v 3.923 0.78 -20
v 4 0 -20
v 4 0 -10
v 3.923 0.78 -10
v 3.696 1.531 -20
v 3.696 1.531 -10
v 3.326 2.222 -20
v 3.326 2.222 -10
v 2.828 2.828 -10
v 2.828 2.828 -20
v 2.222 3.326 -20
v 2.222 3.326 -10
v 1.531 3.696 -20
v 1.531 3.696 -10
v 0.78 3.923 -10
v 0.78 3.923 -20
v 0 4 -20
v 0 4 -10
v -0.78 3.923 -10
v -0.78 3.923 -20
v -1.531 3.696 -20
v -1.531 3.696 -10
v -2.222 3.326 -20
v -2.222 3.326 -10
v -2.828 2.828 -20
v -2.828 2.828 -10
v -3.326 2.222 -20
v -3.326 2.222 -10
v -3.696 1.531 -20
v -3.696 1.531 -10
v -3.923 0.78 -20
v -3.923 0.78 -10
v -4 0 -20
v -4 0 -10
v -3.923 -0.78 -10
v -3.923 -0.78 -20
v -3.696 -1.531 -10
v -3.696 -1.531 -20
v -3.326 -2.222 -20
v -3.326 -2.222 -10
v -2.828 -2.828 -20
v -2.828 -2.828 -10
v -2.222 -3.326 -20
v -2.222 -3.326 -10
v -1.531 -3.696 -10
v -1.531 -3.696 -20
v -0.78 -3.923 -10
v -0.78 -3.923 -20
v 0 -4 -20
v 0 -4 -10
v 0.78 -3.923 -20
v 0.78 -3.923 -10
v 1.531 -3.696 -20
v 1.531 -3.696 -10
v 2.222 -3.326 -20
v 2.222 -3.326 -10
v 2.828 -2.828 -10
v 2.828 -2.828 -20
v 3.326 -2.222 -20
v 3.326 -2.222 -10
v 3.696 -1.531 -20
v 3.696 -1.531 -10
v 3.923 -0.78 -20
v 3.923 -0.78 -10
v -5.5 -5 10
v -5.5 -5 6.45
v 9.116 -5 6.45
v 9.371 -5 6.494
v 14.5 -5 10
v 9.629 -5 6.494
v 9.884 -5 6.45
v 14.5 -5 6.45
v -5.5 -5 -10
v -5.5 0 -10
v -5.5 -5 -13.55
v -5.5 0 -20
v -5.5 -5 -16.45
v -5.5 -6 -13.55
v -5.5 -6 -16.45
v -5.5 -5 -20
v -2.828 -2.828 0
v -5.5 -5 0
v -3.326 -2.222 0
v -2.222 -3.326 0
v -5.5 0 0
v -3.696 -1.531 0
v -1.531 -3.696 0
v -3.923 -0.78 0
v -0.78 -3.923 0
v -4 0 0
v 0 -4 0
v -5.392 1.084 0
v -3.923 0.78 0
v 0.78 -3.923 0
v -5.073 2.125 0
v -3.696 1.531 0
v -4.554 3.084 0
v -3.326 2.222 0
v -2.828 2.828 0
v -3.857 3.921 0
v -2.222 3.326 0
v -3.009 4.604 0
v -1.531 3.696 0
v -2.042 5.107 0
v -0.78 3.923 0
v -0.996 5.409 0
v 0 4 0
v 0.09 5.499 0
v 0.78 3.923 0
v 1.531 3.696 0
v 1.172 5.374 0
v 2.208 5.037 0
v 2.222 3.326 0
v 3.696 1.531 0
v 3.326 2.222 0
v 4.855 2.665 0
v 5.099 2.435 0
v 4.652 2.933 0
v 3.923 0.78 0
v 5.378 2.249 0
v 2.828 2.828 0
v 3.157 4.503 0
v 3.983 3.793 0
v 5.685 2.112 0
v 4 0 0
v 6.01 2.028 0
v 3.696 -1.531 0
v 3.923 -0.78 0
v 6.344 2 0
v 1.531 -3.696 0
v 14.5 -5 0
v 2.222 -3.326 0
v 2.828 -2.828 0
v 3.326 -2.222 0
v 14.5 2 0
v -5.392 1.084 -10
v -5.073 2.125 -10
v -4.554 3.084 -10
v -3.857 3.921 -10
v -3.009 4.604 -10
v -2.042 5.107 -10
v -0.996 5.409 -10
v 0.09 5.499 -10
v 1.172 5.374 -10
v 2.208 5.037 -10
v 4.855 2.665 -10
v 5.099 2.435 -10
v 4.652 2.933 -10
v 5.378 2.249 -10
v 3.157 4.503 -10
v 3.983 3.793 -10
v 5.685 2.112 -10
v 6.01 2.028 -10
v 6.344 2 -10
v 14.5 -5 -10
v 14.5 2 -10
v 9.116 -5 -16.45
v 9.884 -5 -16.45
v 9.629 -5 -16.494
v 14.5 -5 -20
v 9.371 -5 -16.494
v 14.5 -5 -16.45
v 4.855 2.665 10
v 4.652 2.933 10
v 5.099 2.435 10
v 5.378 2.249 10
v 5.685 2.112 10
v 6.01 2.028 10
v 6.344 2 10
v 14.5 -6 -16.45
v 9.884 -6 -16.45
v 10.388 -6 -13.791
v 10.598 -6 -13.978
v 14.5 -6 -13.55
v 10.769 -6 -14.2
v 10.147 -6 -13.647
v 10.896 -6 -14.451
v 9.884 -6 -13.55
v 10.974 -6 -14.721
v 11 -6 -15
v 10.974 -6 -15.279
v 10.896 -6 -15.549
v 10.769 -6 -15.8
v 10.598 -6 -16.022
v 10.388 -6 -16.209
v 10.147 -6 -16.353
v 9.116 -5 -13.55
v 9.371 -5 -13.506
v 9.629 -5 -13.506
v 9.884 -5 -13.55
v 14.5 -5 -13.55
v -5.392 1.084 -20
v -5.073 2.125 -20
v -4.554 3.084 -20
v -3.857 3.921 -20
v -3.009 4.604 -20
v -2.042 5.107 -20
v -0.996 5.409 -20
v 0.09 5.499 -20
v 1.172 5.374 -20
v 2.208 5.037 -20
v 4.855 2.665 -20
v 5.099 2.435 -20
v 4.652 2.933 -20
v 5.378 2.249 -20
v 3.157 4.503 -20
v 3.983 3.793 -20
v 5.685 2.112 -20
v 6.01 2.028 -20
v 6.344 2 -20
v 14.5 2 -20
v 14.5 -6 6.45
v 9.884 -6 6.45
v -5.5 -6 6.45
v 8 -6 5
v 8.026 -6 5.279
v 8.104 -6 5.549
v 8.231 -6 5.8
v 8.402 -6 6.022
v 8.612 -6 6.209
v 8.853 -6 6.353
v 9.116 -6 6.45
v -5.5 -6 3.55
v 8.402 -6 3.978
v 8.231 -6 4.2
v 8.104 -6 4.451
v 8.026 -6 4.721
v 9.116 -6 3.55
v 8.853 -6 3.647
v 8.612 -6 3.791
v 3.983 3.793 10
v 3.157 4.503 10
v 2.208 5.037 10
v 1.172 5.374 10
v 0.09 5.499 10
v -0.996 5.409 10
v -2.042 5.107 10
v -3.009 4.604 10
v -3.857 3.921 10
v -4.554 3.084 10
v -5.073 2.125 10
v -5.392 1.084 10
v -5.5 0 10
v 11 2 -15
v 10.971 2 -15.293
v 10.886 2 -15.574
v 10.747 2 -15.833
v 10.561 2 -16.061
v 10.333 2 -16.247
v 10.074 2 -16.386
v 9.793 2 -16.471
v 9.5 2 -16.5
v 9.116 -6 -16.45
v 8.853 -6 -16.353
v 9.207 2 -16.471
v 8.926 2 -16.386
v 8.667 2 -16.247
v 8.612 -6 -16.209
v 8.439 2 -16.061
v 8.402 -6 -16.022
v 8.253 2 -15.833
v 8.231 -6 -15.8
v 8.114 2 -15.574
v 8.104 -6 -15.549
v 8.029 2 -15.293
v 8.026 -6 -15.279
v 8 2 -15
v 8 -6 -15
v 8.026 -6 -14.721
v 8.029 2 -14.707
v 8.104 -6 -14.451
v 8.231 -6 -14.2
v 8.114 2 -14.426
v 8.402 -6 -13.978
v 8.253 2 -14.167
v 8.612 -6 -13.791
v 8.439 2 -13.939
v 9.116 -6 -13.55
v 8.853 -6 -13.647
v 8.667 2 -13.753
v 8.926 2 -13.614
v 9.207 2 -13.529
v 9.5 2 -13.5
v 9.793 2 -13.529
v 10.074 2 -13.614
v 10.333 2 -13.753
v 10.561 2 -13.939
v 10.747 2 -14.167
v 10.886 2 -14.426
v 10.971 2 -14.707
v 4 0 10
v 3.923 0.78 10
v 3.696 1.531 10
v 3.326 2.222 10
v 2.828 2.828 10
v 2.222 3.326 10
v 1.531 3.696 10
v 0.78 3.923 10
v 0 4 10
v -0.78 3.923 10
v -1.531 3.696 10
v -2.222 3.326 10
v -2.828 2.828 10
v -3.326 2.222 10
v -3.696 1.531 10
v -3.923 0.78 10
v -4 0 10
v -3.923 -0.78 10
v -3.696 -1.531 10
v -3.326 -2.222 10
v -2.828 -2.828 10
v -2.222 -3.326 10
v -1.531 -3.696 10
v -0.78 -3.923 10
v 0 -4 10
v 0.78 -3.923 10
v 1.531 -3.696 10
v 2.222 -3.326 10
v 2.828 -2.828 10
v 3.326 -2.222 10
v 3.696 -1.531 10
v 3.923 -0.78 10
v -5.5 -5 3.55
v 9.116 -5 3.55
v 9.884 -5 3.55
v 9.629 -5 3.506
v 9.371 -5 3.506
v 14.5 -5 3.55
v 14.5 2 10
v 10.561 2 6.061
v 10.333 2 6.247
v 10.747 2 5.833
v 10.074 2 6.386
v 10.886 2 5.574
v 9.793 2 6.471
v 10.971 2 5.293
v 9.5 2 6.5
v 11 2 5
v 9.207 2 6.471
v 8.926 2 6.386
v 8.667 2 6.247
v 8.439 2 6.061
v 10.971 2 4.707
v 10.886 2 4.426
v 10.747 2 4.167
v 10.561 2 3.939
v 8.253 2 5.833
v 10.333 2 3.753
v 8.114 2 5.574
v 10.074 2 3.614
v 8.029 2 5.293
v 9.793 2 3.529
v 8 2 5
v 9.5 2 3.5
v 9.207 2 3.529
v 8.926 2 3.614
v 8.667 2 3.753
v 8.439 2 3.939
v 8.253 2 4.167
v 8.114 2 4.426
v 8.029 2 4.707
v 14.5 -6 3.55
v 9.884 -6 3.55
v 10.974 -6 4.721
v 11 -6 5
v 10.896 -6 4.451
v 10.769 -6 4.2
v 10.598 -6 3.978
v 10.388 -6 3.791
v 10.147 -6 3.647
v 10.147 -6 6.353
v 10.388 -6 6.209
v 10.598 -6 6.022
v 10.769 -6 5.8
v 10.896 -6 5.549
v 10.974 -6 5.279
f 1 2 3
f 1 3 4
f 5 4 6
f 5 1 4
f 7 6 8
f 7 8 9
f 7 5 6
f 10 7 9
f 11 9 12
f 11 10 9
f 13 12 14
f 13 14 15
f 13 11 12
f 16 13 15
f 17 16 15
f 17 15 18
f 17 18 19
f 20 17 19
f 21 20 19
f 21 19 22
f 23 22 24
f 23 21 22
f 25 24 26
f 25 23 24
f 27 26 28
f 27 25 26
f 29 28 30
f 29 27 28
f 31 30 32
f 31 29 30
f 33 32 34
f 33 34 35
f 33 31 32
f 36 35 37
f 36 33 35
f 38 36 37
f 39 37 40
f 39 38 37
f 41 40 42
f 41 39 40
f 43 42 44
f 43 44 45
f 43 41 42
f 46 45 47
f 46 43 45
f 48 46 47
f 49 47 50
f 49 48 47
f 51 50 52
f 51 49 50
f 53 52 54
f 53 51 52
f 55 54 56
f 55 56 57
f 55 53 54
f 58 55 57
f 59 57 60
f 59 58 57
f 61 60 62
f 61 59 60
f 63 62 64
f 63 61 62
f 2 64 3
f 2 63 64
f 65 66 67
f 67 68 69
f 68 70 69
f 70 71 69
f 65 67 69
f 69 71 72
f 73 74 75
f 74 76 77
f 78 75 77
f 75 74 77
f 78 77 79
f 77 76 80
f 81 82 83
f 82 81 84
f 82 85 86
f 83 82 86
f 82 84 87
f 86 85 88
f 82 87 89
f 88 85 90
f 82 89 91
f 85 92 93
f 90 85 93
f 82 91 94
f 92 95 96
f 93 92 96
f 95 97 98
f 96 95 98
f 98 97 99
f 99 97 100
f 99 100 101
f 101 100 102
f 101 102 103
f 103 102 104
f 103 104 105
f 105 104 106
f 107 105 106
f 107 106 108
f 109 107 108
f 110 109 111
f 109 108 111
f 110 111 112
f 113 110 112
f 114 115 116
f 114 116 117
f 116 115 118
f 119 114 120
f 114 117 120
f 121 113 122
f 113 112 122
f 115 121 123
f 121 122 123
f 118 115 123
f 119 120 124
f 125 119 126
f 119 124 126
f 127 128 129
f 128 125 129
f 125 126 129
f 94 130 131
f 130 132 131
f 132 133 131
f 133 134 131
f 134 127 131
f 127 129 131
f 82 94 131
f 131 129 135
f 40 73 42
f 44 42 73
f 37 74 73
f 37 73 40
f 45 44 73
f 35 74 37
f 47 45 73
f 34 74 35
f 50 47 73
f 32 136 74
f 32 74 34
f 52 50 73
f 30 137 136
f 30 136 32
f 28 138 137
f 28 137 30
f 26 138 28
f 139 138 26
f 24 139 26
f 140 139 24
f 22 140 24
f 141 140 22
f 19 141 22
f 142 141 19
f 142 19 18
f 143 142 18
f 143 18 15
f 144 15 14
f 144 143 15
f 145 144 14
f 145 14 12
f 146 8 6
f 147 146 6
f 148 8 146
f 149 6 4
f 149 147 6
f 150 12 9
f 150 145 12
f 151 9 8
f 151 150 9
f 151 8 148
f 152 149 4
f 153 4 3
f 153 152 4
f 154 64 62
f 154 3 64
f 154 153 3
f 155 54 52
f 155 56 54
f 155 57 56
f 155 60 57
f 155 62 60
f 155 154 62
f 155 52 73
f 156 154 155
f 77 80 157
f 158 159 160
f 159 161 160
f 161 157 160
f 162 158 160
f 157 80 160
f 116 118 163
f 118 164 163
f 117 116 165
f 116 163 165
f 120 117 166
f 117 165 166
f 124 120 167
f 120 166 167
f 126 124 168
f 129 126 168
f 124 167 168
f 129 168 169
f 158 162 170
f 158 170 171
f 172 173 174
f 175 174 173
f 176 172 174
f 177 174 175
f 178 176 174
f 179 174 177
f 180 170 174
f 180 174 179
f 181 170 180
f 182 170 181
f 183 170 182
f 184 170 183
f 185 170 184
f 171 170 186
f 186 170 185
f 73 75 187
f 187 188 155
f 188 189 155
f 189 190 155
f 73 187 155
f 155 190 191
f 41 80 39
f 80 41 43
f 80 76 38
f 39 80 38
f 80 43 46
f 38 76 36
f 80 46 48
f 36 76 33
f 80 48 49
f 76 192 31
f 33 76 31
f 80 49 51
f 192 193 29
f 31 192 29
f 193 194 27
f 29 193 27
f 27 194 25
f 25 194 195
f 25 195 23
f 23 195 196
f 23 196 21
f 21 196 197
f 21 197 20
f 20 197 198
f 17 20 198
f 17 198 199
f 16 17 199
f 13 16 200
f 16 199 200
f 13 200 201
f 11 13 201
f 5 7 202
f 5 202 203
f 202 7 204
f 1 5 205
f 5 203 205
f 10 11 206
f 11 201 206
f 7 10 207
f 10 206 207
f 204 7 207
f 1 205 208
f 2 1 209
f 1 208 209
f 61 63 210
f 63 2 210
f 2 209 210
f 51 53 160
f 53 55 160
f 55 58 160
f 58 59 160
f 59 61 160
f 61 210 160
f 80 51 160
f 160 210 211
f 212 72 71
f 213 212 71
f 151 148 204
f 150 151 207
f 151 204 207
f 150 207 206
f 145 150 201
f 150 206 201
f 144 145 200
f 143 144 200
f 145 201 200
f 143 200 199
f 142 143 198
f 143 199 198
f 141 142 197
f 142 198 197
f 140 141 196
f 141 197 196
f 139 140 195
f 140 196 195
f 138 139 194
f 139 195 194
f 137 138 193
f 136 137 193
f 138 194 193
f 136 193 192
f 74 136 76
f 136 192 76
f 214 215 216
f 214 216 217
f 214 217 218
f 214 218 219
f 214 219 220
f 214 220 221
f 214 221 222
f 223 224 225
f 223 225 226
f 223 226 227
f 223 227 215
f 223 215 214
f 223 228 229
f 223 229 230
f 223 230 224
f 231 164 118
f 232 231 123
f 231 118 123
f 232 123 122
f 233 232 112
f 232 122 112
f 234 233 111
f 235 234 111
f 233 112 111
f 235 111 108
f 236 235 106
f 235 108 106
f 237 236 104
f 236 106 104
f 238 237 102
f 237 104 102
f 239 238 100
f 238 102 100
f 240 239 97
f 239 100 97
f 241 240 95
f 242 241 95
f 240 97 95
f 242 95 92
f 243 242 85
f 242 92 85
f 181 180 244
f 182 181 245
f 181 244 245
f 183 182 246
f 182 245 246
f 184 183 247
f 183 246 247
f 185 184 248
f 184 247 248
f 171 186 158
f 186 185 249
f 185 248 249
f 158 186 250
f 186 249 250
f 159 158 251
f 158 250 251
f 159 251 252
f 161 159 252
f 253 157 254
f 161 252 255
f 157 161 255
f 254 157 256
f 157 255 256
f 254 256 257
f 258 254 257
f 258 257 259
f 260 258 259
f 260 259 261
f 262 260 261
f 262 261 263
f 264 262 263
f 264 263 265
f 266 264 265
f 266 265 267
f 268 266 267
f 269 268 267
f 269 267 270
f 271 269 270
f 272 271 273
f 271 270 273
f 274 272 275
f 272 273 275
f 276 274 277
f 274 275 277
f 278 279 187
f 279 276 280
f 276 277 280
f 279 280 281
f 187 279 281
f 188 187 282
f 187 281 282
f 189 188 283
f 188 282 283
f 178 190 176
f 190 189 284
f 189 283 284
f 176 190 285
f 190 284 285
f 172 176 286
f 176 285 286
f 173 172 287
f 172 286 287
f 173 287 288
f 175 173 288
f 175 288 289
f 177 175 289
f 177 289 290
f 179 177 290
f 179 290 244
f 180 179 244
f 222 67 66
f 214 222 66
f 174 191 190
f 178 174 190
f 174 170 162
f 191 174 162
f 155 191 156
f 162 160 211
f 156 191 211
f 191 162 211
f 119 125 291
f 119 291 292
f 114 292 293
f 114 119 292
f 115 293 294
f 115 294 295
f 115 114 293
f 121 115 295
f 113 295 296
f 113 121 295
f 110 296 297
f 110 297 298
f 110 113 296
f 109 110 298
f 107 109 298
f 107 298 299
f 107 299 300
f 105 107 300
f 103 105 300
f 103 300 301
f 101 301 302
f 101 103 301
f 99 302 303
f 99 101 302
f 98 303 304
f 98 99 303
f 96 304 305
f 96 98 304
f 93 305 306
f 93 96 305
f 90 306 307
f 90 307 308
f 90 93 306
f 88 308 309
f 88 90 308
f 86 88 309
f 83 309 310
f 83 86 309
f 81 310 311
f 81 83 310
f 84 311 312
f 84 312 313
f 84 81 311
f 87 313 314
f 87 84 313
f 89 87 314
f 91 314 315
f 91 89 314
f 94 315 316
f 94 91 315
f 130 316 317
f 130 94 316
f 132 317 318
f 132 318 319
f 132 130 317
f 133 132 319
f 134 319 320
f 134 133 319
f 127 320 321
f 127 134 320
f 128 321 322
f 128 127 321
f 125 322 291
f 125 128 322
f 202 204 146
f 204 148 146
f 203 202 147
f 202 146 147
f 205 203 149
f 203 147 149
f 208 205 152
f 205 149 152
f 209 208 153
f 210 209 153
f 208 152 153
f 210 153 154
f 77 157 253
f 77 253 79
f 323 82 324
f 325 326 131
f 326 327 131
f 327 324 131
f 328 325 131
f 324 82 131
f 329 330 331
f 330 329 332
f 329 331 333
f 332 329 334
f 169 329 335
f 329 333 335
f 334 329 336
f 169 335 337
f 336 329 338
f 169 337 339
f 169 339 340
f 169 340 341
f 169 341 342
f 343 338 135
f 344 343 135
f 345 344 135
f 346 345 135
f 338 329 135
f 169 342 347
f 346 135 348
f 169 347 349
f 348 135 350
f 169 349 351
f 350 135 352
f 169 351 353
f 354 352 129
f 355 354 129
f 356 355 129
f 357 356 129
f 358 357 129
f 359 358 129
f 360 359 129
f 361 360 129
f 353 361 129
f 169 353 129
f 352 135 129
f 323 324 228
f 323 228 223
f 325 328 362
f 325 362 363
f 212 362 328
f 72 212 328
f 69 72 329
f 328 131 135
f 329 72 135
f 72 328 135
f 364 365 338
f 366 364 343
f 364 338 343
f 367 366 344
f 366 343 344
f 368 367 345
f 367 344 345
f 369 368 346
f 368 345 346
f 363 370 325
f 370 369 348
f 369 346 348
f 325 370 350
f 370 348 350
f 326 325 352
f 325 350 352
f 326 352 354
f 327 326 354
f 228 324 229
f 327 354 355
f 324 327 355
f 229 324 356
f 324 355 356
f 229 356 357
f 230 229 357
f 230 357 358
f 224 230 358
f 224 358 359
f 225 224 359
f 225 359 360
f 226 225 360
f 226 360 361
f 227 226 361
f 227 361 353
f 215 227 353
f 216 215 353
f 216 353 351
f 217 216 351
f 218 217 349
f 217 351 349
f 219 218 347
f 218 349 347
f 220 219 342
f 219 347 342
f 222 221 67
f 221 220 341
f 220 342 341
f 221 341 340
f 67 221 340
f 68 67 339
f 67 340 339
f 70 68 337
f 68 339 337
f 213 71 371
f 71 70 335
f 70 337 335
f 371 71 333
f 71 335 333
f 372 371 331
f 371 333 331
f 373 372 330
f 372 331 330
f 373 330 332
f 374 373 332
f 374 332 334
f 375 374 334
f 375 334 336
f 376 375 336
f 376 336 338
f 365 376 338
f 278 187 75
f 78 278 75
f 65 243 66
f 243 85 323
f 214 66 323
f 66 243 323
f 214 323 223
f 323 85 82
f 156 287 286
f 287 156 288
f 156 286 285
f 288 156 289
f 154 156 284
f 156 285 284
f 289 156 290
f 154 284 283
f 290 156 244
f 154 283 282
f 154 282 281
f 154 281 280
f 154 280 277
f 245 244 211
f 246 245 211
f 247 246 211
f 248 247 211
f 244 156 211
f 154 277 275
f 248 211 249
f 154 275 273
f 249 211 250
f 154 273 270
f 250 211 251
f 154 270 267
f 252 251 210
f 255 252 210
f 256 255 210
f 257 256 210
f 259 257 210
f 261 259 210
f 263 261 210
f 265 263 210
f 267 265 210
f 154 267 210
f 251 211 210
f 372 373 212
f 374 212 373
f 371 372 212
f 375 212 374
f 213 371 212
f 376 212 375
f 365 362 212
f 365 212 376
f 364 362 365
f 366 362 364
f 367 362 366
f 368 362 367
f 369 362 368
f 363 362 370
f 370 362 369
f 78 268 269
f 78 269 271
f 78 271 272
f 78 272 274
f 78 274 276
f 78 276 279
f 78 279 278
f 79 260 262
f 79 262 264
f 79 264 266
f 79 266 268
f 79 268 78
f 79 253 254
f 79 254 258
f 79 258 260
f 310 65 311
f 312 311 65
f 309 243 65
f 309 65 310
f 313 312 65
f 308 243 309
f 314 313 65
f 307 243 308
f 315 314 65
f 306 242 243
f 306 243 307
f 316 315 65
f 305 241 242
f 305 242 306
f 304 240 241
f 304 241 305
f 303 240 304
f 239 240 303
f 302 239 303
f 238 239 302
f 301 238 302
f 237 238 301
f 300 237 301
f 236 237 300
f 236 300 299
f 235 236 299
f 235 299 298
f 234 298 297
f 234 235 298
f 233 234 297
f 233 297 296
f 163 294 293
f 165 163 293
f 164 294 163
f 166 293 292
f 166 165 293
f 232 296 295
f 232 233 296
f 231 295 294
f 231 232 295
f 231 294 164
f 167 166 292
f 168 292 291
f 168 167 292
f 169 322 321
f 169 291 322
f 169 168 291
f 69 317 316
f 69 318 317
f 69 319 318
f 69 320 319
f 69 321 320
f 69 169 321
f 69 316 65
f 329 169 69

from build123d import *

# Parameters (mm, degrees)
SKETCH1_R                       = 4
MAIN_DEPTH                      = 10
SKETCH3_W                       = 20
SKETCH3_H                       = 2.9
MAKERBEAMRECTANGULARGUIDE_DEPTH = 1
SKETCH4_R                       = 1.5
MAKERBEAMFIXHOLE_DEPTH          = 9
FILLET1_R                       = 2
LPATTERN1_COUNT                 = 2
LPATTERN1_PITCH                 = 20


with BuildPart() as part:
    # Sketch1 → Main (new body)
    with BuildSketch(Plane.XY):
        with BuildLine():
            Line((-5.5, 0), (-5.5, -5))
            Line((-5.5, -5), (14.5, -5))
            Line((14.5, -5), (14.5, 2))
            Line((14.5, 2), (5.123475383, 2))
            ThreePointArc((5.123475383, 2), (-1.017567048, 5.405049242), (-5.5, 0))
        make_face()
        Circle(SKETCH1_R, mode=Mode.SUBTRACT)
    extrude(amount=MAIN_DEPTH)

    # Sketch3 → MakerBeamRectangularGuide (add)
    with BuildSketch(Plane(origin=(0, -5, 0), x_dir=(-1, 0, 0), z_dir=(0, -1, 0))):
        with Locations((-4.5, -5)):
            Rectangle(SKETCH3_W, SKETCH3_H)
    extrude(amount=MAKERBEAMRECTANGULARGUIDE_DEPTH)

    # Sketch4 → MakerBeamFixHole (cut, through all)
    with BuildSketch(Plane(origin=(0, 2, 0), x_dir=(1, 0, 0), z_dir=(0, 1, 0))):
        with Locations((9.5, -5)):
            Circle(SKETCH4_R)
    extrude(amount=-MAKERBEAMFIXHOLE_DEPTH, mode=Mode.SUBTRACT)

    # Fillet1
    fillet1_edges = [part.edges().sort_by_distance(p)[0] for p in [
        (5.123475383, 2, 5),
    ]]
    fillet(fillet1_edges, radius=FILLET1_R)


with BuildPart() as lpattern1_1:
    # LPattern1: pattern copy
    add(part.part.moved(Location(Vector(0, 0, -1) * (1 * LPATTERN1_PITCH))))


solid = Compound([part.part, lpattern1_1.part])
